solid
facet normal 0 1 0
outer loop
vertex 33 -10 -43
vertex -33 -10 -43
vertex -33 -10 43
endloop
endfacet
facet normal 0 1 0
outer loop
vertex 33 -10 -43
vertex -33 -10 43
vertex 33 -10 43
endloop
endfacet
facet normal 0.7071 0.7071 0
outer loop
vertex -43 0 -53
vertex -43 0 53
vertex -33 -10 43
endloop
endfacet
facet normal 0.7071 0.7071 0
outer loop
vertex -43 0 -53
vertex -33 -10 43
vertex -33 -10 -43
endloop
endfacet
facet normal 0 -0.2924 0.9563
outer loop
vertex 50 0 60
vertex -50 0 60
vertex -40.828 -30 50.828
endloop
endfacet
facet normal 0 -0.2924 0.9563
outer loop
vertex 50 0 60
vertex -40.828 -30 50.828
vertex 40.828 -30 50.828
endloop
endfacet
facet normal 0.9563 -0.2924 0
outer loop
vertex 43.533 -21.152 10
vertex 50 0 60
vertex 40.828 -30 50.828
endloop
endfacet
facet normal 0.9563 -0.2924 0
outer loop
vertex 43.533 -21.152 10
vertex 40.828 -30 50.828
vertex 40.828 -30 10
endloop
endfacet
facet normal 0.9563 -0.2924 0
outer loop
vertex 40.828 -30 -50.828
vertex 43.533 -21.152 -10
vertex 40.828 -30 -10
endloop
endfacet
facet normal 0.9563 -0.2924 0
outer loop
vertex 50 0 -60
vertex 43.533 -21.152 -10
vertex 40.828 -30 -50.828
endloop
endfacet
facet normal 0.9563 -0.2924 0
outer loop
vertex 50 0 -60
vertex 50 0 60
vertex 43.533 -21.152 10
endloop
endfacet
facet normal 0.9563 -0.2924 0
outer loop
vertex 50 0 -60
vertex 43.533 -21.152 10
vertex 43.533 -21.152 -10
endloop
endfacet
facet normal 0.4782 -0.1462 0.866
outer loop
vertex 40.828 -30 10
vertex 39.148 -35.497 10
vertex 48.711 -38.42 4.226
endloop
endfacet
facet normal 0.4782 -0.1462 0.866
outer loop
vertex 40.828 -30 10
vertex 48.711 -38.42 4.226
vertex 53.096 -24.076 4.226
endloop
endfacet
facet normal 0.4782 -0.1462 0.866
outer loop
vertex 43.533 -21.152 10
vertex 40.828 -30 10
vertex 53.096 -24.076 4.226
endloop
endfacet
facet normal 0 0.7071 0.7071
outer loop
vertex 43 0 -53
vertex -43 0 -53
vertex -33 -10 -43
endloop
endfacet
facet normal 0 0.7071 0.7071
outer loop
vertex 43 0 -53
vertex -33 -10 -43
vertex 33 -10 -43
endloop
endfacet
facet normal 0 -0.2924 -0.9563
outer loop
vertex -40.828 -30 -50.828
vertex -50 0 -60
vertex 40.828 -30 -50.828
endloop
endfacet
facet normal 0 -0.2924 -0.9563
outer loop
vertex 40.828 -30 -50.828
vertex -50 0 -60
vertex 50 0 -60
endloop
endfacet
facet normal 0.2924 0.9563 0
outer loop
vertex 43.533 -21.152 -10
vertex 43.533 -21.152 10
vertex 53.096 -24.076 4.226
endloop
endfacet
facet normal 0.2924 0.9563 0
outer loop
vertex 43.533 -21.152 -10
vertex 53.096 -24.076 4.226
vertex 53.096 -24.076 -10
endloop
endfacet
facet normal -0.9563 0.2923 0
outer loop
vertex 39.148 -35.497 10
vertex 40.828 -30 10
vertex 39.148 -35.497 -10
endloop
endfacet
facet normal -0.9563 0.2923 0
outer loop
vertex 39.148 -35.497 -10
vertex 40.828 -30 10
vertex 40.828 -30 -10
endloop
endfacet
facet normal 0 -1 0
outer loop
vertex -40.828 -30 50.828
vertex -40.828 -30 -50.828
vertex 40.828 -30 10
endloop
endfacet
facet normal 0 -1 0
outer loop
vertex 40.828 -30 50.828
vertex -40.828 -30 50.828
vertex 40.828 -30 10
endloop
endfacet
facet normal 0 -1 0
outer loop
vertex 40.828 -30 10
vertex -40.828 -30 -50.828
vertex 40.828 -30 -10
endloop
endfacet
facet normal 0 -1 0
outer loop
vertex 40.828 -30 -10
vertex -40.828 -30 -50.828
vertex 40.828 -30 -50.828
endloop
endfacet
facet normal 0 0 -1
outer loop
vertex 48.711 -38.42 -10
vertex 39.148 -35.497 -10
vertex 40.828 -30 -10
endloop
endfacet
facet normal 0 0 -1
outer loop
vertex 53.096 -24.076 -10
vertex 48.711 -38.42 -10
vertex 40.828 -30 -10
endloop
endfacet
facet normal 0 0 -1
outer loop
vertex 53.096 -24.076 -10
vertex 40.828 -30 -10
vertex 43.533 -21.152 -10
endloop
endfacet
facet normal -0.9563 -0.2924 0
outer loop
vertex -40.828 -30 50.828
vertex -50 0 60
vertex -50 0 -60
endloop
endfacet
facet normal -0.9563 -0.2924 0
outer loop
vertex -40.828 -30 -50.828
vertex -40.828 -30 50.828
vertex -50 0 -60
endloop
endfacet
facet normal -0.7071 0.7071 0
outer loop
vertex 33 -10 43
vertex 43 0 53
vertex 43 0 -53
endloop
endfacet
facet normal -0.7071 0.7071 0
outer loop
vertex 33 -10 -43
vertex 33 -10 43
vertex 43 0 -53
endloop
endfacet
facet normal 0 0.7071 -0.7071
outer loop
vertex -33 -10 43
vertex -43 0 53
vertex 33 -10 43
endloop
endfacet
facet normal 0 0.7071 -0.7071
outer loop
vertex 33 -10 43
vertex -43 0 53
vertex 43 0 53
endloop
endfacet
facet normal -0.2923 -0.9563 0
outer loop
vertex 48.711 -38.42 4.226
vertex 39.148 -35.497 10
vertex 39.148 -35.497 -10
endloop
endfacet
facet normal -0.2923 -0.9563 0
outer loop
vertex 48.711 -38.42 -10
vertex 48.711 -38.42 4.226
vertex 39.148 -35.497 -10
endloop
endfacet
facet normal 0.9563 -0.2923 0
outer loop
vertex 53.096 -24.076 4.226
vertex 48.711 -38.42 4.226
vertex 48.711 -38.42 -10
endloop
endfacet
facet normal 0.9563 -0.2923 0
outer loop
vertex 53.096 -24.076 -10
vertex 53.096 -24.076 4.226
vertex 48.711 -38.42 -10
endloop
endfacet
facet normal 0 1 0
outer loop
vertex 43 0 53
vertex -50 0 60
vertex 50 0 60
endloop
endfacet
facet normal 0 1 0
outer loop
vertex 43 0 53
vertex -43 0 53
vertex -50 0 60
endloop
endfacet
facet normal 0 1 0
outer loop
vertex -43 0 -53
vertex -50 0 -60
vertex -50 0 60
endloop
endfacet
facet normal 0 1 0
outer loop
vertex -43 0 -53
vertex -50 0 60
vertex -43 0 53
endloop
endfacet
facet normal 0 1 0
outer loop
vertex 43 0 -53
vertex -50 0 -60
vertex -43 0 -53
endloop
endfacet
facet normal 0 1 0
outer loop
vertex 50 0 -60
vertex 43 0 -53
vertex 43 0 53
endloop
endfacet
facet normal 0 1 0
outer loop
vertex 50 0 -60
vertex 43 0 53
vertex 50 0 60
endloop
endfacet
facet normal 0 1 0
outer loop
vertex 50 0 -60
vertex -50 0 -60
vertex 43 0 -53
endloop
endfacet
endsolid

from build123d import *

# Parameters (mm, degrees)
SKETCH1_W           = 100
SKETCH1_H           = 120
BOSS_EXTRUDE1_DEPTH = 30
BOSS_EXTRUDE1_DRAFT = -17
SKETCH2_W           = 86
SKETCH2_H           = 106
CUT_EXTRUDE1_DEPTH  = 10
SKETCH3_W           = 20
SKETCH3_H           = 15
BOSS_EXTRUDE2_DEPTH = 10
DRAFT1_ANGLE        = 45
DRAFT2_ANGLE        = 30


with BuildPart() as part:
    # Sketch1 → Boss-Extrude1 (with draft: the straight prism first)
    with BuildSketch(Plane(origin=(0, 0, 0), x_dir=(1, 0, 0), z_dir=(0, 1, 0))):
        Rectangle(SKETCH1_W, SKETCH1_H)
    extrude(amount=-BOSS_EXTRUDE1_DEPTH)
    # Boss-Extrude1: the draft: its side faces are tilted about the plane it starts from
    boss_extrude1_sides = [part.faces().sort_by_distance(p)[0] for p in [
        (-50, -15, 0),
        (0, -15, 60),
        (50, -15, 0),
        (0, -15, -60),
    ]]
    draft(boss_extrude1_sides, Plane(origin=(0, 0, 0), x_dir=(1, 0, 0), z_dir=(0, 1, 0)), BOSS_EXTRUDE1_DRAFT)

    # Sketch2 → Cut-Extrude1 (cut)
    with BuildSketch(Plane(origin=(0, 0, 0), x_dir=(1, 0, 0), z_dir=(0, 1, 0))):
        Rectangle(SKETCH2_W, SKETCH2_H)
    extrude(amount=-CUT_EXTRUDE1_DEPTH, mode=Mode.SUBTRACT)

    # Sketch3 → Boss-Extrude2 (add)
    with BuildSketch(Plane(origin=(45.725939314, -13.979822587, 0), x_dir=(0, 0, -1), z_dir=(0.9563047559630354, -0.2923717047227369, 0))):
        with Locations((0, -15)):
            Rectangle(SKETCH3_W, SKETCH3_H)
    extrude(amount=BOSS_EXTRUDE2_DEPTH)

    # Draft1
    draft1_faces = [part.faces().sort_by_distance(p)[0] for p in [
        (0, -5, 53),
        (43, -5, 0),
        (0, -5, -53),
        (-43, -5, 0),
    ]]
    draft(draft1_faces, Plane.ZX, DRAFT1_ANGLE)

    # Draft2
    draft2_faces = [part.faces().sort_by_distance(p)[0] for p in [
        (46.121887523, -29.78625245, 10),
    ]]
    draft(draft2_faces, Plane(origin=(50, 0, -60), x_dir=(0.2923717047227369, 0.9563047559630354, 0), z_dir=(0.9563047559630354, -0.2923717047227369, 0)), DRAFT2_ANGLE)


solid = part.part
